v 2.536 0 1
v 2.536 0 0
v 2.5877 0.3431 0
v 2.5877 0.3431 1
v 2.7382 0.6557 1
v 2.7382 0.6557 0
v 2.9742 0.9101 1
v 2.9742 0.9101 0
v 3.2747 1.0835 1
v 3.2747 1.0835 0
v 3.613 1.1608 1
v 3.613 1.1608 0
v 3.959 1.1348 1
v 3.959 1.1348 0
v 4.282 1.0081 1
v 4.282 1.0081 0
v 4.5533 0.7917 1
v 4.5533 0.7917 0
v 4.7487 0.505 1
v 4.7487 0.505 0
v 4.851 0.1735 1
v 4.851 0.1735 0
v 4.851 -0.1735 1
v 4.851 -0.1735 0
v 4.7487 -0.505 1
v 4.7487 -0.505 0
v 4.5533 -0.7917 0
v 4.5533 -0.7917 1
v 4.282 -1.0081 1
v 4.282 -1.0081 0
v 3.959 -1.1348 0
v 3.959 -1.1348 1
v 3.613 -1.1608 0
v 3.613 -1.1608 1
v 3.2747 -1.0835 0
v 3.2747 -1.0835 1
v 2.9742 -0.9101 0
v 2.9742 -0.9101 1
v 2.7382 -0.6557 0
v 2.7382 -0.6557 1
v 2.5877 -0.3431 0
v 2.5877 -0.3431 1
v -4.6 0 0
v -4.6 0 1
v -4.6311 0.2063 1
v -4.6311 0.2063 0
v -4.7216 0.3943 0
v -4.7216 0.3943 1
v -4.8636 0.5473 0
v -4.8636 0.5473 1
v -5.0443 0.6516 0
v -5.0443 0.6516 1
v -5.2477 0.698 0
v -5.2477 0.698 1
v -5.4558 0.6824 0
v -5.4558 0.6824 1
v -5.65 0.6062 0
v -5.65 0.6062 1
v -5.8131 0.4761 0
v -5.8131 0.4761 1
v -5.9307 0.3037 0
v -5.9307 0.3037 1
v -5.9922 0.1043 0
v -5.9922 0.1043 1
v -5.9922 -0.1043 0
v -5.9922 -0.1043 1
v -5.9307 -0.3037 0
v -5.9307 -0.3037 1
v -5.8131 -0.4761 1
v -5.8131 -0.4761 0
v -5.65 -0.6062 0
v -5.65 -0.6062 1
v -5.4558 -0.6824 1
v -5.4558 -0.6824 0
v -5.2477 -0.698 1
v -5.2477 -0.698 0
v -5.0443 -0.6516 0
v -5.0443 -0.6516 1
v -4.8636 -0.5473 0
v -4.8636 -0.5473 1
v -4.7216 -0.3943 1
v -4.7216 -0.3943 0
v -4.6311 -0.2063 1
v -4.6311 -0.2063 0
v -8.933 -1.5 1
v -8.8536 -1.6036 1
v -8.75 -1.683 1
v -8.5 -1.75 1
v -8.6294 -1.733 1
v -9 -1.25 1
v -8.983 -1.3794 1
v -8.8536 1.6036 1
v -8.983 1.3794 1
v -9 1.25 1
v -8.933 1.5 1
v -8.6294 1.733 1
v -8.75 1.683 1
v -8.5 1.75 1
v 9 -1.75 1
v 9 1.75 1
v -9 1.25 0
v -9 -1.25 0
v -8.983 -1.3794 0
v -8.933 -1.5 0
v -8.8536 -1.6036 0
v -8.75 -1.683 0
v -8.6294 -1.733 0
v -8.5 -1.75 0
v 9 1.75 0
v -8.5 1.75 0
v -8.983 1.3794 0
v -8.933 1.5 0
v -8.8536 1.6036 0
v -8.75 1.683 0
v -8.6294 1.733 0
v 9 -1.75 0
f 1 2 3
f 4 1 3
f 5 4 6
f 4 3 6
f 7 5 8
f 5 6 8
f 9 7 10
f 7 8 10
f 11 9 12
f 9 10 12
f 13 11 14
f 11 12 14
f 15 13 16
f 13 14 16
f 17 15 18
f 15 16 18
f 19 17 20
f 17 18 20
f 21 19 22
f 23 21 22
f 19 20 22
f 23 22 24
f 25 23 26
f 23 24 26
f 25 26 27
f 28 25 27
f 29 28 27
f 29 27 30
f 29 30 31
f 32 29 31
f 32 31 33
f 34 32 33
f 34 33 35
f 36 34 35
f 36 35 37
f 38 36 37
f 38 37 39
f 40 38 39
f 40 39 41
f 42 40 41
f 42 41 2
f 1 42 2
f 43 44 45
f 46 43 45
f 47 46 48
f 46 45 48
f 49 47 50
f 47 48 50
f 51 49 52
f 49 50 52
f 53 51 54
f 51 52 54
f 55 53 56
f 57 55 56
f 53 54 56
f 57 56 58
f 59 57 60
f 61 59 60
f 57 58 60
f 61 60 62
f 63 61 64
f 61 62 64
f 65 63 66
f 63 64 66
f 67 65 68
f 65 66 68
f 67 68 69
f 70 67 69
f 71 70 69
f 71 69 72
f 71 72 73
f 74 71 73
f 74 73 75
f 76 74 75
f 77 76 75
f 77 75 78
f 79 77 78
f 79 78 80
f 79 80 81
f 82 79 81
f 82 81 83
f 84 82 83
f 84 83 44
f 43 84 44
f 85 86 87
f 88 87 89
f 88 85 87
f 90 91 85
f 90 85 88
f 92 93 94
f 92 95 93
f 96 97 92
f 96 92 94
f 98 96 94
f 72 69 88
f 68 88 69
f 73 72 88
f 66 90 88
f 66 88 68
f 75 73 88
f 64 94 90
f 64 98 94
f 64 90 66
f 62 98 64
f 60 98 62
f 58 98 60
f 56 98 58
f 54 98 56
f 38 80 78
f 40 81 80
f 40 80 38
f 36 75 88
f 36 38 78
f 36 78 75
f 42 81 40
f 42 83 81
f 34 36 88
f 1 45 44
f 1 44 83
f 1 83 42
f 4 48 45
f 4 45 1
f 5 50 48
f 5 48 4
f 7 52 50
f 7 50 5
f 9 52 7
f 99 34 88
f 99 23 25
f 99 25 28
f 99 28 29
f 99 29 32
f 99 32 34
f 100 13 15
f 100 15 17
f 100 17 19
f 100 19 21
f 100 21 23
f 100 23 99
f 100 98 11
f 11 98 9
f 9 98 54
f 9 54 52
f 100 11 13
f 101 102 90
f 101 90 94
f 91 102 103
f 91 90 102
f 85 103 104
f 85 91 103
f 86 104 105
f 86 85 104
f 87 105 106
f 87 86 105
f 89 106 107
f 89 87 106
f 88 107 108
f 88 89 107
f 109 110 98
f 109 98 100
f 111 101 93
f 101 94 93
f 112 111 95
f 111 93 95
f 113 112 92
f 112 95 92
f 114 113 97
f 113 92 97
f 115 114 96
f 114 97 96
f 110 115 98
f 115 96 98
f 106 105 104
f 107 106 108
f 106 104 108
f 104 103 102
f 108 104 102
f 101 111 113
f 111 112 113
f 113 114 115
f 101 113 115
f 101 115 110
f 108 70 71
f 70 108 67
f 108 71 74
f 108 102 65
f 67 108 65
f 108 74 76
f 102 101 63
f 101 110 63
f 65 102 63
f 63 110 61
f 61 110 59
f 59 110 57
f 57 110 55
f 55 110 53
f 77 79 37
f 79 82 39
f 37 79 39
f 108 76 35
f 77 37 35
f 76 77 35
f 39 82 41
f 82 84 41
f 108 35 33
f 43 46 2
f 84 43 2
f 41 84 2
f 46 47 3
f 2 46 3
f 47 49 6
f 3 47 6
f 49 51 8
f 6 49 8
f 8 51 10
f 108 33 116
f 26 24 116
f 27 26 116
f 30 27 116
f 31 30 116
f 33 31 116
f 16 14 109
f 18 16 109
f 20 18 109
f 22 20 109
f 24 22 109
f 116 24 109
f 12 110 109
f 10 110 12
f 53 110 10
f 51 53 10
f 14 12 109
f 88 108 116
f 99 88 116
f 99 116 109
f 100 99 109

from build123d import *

# Parameters (mm, degrees)
SKETCH2_W           = 18
SKETCH2_H           = 3.5
BOSS_EXTRUDE1_DEPTH = 1
SKETCH3_R           = 0.7
CUT_EXTRUDE1_DEPTH  = 2
FILLET1_R           = 0.5
SKETCH4_OUTSIDE_W   = 23.672
SKETCH4_OUTSIDE_H   = 9.172
SKETCH4_OUTSIDE_R   = 1.164013777
CUT_EXTRUDE3_DEPTH  = 2


with BuildPart() as part:
    # Sketch2 → Boss-Extrude1 (new body)
    with BuildSketch(Plane.XY):
        Rectangle(SKETCH2_W, SKETCH2_H)
    extrude(amount=BOSS_EXTRUDE1_DEPTH)

    # Sketch3 → Cut-Extrude1 (cut, through all)
    with BuildSketch(Plane.XY.offset(1)):
        with Locations((-5.3, 0)):
            Circle(SKETCH3_R)
    extrude(amount=-CUT_EXTRUDE1_DEPTH, mode=Mode.SUBTRACT)

    # Fillet1
    fillet1_edges = [part.edges().sort_by_distance(p)[0] for p in [
        (-9, -1.75, 0.5),
        (-9, 1.75, 0.5),
    ]]
    fillet(fillet1_edges, radius=FILLET1_R)

    # Sketch4 outside → Cut-Extrude3 (cut, through all)
    with BuildSketch(Plane(origin=(0, 0, 0), x_dir=(-1, 0, 0), z_dir=(0, 0, -1))):
        Rectangle(SKETCH4_OUTSIDE_W, SKETCH4_OUTSIDE_H)
        with BuildLine():
            Line((-9, -1.75), (8.5, -1.75))
            ThreePointArc((8.5, -1.75), (8.853553391, -1.603553391), (9, -1.25))
            Line((9, -1.25), (9, 1.25))
            ThreePointArc((9, 1.25), (8.853553391, 1.603553391), (8.5, 1.75))
            Line((8.5, 1.75), (-9, 1.75))
            Line((-9, 1.75), (-9, -1.75))
        make_face(mode=Mode.SUBTRACT)
        with Locations((-3.7, 0)):
            Circle(SKETCH4_OUTSIDE_R)
    extrude(amount=-CUT_EXTRUDE3_DEPTH, mode=Mode.SUBTRACT)


solid = part.part
